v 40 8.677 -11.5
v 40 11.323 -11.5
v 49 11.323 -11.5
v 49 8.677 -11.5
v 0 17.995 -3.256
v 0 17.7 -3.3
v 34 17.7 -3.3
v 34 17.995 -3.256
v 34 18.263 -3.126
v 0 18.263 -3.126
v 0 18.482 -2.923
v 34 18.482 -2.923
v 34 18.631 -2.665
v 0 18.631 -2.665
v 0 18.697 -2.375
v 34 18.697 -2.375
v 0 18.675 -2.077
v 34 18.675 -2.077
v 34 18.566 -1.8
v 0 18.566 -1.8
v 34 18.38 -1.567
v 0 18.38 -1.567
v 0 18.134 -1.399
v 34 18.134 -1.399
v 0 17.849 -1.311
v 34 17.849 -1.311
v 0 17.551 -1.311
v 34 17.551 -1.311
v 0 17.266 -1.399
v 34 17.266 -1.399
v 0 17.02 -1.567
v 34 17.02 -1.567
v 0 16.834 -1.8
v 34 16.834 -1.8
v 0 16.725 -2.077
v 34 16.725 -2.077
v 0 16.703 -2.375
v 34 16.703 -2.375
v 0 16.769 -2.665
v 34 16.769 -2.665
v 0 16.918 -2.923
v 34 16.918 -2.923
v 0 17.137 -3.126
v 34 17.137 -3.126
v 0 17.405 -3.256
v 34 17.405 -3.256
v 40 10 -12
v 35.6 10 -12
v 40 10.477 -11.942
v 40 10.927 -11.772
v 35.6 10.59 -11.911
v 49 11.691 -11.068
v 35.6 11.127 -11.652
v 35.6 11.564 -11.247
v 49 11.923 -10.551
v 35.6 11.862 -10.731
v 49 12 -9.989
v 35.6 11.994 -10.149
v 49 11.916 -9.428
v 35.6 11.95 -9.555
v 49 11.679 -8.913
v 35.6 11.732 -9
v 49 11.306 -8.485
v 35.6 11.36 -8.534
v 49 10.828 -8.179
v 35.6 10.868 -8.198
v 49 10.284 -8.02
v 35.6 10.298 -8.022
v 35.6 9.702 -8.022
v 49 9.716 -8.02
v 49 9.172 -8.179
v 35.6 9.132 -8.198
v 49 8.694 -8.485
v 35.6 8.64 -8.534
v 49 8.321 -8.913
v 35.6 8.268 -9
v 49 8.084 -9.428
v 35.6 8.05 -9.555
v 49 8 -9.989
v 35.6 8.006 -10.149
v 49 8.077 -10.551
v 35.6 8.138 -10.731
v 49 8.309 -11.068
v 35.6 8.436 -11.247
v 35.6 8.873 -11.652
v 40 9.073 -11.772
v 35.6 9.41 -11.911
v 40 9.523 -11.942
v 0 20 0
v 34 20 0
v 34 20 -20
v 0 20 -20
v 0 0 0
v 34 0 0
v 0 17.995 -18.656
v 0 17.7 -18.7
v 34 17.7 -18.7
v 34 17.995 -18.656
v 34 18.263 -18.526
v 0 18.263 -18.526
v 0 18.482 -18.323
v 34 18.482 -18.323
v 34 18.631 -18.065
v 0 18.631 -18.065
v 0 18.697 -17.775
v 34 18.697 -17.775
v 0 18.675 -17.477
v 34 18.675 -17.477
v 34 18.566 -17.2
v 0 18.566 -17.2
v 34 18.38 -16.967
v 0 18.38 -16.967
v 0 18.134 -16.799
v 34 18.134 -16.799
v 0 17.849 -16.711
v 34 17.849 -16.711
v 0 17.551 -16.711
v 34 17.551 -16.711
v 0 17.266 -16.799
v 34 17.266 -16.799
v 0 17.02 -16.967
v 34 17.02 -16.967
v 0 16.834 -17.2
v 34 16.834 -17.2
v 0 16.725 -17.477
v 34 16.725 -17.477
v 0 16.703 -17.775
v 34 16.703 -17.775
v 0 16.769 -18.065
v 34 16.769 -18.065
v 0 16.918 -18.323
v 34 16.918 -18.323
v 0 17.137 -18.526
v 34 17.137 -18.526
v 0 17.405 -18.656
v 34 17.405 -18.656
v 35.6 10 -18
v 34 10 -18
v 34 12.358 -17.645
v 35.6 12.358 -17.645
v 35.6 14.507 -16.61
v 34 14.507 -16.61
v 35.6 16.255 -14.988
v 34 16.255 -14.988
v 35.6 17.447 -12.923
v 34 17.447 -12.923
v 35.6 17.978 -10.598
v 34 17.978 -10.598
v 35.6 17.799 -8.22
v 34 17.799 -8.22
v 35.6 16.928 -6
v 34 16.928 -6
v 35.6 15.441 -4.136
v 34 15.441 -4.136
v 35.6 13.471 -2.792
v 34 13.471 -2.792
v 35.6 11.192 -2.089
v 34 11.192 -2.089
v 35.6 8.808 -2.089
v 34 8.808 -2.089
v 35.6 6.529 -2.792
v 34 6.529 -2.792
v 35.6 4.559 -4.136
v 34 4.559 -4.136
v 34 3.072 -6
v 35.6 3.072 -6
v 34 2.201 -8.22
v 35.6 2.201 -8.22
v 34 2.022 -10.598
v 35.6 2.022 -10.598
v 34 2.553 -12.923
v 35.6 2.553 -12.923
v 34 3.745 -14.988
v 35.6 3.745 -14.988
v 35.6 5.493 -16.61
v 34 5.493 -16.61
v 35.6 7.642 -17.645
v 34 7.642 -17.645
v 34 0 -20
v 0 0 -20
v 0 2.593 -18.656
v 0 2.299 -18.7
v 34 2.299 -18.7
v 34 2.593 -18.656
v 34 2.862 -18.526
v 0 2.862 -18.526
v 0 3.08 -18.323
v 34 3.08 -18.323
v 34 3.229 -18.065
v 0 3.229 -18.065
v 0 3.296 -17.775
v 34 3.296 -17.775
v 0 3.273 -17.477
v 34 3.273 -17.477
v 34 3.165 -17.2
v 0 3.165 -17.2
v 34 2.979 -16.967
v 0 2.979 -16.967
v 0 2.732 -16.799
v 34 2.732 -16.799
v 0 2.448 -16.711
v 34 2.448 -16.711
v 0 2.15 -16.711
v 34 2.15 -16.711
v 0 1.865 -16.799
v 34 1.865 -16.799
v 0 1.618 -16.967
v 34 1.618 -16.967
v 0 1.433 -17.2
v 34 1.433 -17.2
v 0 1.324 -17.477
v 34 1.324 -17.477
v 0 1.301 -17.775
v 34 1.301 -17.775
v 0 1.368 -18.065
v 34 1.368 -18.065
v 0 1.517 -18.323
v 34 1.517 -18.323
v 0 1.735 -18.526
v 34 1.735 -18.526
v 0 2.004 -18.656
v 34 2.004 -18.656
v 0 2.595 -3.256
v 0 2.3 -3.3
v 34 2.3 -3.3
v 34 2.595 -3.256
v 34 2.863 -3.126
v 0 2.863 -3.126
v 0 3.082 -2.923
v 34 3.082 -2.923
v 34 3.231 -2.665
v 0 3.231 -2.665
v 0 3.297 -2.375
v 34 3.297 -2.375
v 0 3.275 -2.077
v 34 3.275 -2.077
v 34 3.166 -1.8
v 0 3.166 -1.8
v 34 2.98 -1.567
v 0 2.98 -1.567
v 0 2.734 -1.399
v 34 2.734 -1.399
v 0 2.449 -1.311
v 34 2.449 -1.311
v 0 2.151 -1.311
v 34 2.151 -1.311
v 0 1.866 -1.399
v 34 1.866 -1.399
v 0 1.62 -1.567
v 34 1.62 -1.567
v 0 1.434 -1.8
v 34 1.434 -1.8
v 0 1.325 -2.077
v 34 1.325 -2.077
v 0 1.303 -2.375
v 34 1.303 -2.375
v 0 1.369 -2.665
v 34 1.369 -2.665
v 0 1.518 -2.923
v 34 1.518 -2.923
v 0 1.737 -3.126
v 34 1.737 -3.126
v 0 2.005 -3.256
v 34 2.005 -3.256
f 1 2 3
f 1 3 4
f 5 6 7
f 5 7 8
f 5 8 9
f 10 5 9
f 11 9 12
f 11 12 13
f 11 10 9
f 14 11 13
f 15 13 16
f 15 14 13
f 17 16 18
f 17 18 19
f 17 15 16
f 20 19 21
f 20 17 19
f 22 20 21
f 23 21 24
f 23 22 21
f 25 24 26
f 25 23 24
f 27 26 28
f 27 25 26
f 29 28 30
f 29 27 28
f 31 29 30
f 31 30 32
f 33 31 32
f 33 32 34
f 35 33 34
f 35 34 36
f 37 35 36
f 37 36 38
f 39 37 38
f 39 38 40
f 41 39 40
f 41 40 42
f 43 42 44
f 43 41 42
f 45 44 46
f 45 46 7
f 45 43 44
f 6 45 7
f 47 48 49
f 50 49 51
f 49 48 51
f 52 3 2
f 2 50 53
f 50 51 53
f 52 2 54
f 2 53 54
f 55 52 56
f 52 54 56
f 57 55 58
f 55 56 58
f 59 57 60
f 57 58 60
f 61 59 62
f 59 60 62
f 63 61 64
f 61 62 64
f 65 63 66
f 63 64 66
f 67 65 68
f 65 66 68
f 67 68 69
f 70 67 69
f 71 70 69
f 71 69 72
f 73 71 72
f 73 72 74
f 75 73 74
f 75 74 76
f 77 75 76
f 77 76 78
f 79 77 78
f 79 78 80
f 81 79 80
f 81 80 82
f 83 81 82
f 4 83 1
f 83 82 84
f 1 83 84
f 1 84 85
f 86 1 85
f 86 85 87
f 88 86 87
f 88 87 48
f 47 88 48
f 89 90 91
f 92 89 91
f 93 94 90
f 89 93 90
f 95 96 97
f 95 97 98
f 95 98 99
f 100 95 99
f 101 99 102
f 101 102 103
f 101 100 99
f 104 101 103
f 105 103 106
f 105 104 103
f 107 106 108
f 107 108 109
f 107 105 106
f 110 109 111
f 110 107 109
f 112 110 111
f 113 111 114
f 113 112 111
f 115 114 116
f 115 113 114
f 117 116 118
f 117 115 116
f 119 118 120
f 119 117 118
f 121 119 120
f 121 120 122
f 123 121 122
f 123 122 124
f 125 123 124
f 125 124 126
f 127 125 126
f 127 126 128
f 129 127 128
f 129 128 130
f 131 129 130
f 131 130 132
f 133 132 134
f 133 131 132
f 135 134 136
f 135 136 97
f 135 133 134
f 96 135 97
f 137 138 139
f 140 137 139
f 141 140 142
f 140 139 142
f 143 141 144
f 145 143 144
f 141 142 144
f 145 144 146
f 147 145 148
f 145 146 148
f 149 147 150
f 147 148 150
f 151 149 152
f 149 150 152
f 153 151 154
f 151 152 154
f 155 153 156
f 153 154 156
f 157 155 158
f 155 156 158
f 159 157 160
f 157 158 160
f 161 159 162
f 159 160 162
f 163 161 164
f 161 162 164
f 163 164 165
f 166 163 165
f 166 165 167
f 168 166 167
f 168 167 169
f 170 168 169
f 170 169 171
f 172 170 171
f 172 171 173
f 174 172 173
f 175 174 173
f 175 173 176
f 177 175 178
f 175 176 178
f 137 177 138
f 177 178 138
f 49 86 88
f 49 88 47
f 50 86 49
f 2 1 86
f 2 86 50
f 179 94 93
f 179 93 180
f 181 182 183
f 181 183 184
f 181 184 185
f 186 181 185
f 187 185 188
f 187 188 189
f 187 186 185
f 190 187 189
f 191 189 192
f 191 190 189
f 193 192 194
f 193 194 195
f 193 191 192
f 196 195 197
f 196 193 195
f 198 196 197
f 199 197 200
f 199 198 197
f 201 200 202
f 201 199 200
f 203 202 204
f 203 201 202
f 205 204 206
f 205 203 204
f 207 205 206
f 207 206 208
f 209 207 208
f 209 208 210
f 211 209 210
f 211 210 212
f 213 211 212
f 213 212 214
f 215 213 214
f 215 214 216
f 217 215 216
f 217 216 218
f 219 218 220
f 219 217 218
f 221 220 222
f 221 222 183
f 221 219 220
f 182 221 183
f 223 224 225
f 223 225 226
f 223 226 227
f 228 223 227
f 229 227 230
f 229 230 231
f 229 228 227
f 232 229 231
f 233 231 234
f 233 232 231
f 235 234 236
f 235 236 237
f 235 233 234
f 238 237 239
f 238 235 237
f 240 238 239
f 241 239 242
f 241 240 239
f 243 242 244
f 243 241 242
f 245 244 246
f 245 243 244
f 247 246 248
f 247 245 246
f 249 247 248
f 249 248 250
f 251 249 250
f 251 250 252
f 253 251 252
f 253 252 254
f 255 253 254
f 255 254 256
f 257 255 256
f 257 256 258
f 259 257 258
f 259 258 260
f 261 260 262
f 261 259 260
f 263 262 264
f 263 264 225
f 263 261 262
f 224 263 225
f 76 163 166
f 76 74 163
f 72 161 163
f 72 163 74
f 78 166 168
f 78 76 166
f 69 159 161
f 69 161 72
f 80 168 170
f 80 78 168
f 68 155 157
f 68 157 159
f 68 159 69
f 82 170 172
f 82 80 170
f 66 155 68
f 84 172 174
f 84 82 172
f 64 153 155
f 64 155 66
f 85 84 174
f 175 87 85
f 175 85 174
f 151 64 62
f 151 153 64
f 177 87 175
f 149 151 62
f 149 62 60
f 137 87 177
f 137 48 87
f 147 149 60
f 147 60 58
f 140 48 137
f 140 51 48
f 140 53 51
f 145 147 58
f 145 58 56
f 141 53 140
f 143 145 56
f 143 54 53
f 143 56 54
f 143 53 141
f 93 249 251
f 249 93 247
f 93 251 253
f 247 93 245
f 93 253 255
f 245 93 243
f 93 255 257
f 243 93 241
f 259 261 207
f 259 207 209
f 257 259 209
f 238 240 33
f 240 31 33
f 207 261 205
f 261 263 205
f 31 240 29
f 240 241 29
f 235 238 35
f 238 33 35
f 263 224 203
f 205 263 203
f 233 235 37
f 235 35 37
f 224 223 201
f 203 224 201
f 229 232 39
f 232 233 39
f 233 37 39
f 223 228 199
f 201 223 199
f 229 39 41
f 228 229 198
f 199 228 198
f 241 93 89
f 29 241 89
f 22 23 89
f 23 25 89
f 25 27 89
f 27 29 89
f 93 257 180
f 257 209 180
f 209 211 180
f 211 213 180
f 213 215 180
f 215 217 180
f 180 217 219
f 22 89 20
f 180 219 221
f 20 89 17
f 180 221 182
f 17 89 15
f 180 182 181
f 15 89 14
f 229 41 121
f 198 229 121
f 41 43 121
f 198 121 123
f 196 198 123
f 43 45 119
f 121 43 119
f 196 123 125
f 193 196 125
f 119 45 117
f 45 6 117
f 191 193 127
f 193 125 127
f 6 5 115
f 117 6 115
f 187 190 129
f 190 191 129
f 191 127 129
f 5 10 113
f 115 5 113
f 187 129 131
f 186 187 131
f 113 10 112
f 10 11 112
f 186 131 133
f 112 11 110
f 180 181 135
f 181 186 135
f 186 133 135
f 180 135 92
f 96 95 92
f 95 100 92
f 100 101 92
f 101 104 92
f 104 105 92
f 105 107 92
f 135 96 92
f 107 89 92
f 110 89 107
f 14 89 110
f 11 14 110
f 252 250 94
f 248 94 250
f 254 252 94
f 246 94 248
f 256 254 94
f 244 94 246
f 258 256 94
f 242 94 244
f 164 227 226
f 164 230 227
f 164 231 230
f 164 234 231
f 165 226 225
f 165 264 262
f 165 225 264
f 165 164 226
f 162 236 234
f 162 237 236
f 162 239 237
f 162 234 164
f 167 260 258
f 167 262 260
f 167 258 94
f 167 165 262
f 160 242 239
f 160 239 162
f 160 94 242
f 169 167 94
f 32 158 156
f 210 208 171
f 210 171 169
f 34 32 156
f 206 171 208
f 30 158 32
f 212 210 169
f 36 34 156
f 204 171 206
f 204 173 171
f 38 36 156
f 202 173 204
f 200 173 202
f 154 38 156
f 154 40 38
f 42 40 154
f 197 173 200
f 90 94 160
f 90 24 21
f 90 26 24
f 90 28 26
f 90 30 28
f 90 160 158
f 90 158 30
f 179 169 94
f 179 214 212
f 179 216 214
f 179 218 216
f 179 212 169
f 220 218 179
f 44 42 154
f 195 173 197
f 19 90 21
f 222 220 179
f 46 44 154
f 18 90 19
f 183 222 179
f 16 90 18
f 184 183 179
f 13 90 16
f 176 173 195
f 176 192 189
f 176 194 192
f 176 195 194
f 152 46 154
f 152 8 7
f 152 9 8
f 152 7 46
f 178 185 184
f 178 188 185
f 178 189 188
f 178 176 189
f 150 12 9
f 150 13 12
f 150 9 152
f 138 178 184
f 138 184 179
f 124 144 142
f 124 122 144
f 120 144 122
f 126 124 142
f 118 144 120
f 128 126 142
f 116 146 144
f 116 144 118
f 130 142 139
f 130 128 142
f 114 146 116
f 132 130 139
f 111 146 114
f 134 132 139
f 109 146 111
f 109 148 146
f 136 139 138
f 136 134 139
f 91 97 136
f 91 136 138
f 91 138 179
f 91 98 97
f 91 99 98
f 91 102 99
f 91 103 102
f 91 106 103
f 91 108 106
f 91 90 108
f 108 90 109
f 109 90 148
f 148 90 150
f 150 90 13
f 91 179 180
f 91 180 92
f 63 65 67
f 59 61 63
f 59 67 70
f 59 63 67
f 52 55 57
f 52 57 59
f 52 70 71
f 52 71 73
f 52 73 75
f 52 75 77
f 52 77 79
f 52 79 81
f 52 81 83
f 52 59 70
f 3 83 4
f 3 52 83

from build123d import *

# Parameters (mm, degrees)
SKETCH_1_W          = 20
SKETCH_1_H          = 20
SKETCH_1_R          = 1
EXTRUDE_2_DEPTH     = 34
SKETCH_2_R          = 8
EXTRUDE_3_DEPTH     = 1.6
SKETCH_3_R          = 2
EXTRUDE_4_DEPTH     = 13.4
CUT_EXTRUDE_START   = -9
CUT_EXTRUDE_1_DEPTH = 9


with BuildPart() as part:
    # 草图1 → 凸台-拉伸2 (new body)
    with BuildSketch(Plane(origin=(0, 0, 0), x_dir=(0, 0, -1), z_dir=(1, 0, 0))):
        with Locations((10, 10)):
            Rectangle(SKETCH_1_W, SKETCH_1_H)
        with Locations((2.3, 2.3)):
            Circle(SKETCH_1_R, mode=Mode.SUBTRACT)
        with Locations((2.3, 17.7)):
            Circle(SKETCH_1_R, mode=Mode.SUBTRACT)
        with Locations((17.7, 17.7)):
            Circle(SKETCH_1_R, mode=Mode.SUBTRACT)
        with Locations((17.7, 2.298566716)):
            Circle(SKETCH_1_R, mode=Mode.SUBTRACT)
    extrude(amount=EXTRUDE_2_DEPTH)

    # 草图2 → 凸台-拉伸3 (add)
    with BuildSketch(Plane(origin=(34, 0, 0), x_dir=(0, 0, -1), z_dir=(1, 0, 0))):
        with Locations((10, 10)):
            Circle(SKETCH_2_R)
    extrude(amount=EXTRUDE_3_DEPTH)

    # 草图3 → 凸台-拉伸4 (add)
    with BuildSketch(Plane(origin=(35.6, 0, 0), x_dir=(0, 0, -1), z_dir=(1, 0, 0))):
        with Locations((10, 10)):
            Circle(SKETCH_3_R)
    extrude(amount=EXTRUDE_4_DEPTH)

    # 草图4 → 切除-拉伸1 (cut)
    with BuildSketch(Plane(origin=(49, 0, 0), x_dir=(0, 0, -1), z_dir=(1, 0, 0)).offset(CUT_EXTRUDE_START)):
        with BuildLine():
            Line((11.5, 11.322875656), (11.5, 10))
            Line((11.5, 10), (11.5, 8.677124344))
            ThreePointArc((11.5, 8.677124344), (11.870828693, 9.292893219), (12, 10))
            ThreePointArc((12, 10), (11.870828693, 10.707106781), (11.5, 11.322875656))
        make_face()
    extrude(amount=CUT_EXTRUDE_1_DEPTH, mode=Mode.SUBTRACT)


solid = part.part
